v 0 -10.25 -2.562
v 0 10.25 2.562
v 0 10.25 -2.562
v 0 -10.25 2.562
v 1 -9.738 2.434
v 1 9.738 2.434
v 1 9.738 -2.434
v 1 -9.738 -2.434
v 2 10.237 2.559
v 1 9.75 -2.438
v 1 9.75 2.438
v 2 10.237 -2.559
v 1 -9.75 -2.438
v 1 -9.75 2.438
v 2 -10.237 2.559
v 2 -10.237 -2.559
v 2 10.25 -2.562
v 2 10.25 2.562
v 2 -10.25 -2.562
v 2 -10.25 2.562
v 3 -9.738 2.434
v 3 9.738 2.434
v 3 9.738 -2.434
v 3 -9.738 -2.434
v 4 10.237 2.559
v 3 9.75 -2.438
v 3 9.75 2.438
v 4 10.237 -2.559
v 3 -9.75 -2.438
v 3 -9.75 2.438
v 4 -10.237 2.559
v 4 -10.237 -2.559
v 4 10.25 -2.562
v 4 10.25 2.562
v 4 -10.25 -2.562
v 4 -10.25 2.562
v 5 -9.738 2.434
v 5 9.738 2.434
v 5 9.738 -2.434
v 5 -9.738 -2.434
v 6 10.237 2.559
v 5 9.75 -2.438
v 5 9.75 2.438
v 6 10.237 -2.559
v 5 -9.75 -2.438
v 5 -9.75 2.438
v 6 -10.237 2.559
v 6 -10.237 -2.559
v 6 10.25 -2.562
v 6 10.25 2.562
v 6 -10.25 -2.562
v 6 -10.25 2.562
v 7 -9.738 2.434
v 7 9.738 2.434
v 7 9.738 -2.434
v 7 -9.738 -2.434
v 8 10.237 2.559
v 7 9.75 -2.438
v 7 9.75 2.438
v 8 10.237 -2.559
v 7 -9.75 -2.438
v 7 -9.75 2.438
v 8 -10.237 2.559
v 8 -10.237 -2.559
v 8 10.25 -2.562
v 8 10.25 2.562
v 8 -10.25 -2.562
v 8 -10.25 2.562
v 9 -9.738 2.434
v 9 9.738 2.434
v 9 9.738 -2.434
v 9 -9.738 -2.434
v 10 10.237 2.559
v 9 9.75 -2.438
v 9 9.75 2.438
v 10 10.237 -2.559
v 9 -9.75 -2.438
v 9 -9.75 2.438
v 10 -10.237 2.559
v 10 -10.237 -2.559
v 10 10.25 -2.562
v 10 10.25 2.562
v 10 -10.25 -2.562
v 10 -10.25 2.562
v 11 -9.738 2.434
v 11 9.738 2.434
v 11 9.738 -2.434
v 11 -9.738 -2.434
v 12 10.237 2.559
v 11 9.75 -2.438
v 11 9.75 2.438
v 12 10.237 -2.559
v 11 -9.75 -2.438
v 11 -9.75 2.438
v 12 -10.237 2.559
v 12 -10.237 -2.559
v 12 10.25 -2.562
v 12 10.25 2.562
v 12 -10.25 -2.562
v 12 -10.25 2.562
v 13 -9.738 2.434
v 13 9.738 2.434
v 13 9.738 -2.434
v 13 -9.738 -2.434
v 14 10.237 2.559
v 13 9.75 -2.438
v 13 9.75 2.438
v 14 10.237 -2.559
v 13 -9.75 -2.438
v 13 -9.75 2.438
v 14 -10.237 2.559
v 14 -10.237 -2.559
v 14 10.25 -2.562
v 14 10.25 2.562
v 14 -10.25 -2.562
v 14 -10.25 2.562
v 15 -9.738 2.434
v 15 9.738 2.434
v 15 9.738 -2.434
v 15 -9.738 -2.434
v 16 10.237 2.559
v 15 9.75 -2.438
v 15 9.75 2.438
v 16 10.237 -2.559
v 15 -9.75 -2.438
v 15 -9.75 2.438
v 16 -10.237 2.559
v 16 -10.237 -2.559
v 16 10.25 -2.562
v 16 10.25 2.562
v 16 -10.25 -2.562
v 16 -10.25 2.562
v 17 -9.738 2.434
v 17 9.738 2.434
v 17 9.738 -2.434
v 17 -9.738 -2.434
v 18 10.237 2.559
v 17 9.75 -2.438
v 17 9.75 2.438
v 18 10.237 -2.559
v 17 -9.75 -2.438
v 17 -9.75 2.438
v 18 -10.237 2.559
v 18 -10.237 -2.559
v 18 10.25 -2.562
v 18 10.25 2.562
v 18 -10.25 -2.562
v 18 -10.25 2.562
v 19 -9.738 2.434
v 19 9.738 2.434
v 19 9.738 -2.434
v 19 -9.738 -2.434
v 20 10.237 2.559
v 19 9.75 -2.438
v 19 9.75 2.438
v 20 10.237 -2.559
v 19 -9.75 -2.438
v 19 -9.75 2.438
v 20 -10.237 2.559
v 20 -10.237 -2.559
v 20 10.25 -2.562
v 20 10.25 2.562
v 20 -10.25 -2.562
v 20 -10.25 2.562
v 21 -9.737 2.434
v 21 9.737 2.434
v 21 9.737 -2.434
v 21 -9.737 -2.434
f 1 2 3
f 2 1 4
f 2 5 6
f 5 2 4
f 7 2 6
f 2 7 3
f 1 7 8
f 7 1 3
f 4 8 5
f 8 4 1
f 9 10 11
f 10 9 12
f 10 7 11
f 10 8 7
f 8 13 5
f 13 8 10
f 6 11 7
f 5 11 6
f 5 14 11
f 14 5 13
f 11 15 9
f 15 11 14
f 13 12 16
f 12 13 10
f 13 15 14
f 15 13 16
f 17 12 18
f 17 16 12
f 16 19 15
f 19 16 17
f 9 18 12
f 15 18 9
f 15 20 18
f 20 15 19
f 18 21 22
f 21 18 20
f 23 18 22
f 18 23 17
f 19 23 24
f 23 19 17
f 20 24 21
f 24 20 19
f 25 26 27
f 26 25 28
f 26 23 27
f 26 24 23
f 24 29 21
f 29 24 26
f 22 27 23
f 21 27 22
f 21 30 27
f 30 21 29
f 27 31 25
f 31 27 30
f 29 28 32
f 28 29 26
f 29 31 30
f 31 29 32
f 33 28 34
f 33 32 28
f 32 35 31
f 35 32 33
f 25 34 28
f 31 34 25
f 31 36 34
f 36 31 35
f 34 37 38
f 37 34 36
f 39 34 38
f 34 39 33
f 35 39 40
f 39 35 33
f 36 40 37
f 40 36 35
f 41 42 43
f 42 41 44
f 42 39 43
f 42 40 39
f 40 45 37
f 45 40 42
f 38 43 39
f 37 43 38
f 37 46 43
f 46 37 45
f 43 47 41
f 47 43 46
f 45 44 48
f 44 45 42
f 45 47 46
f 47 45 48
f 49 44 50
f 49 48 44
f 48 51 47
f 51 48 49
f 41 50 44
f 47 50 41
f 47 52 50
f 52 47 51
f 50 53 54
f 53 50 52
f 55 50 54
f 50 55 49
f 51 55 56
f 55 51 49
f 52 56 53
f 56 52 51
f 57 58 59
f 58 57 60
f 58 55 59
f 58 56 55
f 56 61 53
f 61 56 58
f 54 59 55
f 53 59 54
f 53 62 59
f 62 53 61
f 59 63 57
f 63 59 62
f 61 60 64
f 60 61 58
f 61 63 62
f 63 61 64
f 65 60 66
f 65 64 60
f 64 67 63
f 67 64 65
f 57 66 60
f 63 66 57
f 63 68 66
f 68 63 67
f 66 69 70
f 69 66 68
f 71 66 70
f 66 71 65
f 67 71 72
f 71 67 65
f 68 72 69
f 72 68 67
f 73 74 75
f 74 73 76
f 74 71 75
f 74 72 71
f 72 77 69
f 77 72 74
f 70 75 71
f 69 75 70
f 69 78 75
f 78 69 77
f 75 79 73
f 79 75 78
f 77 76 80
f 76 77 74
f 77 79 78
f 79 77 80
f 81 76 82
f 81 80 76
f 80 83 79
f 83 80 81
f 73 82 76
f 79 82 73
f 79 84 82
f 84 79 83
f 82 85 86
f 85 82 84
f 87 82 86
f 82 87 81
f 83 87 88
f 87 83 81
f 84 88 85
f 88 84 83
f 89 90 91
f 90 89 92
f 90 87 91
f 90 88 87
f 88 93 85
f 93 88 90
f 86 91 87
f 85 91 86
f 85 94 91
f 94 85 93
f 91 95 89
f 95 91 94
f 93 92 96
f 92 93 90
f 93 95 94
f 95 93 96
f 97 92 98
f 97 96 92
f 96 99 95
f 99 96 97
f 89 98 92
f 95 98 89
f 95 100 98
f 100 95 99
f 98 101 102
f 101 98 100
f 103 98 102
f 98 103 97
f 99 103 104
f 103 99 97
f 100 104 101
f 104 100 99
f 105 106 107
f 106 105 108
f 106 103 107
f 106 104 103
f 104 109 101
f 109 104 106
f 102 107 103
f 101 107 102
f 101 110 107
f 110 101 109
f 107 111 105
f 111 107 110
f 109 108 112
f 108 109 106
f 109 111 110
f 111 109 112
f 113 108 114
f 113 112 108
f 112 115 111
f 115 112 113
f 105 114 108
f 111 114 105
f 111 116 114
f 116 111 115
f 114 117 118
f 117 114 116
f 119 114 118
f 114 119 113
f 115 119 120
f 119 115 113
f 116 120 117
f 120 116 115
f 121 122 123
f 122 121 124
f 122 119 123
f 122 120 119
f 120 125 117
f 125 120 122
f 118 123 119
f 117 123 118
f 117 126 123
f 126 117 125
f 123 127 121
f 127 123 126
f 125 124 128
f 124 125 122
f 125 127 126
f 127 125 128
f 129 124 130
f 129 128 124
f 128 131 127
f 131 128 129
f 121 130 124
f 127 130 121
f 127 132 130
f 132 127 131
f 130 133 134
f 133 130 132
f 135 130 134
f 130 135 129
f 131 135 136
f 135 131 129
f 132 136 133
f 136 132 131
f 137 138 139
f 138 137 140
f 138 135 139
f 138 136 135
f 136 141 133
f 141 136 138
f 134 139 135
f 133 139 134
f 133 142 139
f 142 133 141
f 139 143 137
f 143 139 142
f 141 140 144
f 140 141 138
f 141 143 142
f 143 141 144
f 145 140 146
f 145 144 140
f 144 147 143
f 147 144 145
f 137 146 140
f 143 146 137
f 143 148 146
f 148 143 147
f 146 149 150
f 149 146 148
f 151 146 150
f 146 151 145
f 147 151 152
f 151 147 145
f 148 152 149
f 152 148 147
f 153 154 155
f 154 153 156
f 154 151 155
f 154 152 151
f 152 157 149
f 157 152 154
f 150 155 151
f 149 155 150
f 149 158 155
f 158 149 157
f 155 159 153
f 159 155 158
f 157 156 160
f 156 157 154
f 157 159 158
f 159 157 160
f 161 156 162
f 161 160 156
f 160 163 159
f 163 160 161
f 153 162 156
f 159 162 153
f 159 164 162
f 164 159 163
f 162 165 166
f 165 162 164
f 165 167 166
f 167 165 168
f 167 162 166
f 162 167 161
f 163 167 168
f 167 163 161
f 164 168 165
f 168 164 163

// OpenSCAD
//-*- C -*-



separation=20.;
width=5.;
waveLength=1;
dblamplitude=1.;


for (iii =[0:20])
 translate([(iii)*waveLength-0.00001,0,0]) rotate([0,90,0]) linear_extrude(height = waveLength+0.00002, center=false, convexity=10, twist=0, slices=1, scale = 1.+(iii%2-0.5)*2.*dblamplitude/separation)
    square([width-(iii%2-0.5)*dblamplitude*width/separation,separation-(iii%2-0.5)*dblamplitude],true);
